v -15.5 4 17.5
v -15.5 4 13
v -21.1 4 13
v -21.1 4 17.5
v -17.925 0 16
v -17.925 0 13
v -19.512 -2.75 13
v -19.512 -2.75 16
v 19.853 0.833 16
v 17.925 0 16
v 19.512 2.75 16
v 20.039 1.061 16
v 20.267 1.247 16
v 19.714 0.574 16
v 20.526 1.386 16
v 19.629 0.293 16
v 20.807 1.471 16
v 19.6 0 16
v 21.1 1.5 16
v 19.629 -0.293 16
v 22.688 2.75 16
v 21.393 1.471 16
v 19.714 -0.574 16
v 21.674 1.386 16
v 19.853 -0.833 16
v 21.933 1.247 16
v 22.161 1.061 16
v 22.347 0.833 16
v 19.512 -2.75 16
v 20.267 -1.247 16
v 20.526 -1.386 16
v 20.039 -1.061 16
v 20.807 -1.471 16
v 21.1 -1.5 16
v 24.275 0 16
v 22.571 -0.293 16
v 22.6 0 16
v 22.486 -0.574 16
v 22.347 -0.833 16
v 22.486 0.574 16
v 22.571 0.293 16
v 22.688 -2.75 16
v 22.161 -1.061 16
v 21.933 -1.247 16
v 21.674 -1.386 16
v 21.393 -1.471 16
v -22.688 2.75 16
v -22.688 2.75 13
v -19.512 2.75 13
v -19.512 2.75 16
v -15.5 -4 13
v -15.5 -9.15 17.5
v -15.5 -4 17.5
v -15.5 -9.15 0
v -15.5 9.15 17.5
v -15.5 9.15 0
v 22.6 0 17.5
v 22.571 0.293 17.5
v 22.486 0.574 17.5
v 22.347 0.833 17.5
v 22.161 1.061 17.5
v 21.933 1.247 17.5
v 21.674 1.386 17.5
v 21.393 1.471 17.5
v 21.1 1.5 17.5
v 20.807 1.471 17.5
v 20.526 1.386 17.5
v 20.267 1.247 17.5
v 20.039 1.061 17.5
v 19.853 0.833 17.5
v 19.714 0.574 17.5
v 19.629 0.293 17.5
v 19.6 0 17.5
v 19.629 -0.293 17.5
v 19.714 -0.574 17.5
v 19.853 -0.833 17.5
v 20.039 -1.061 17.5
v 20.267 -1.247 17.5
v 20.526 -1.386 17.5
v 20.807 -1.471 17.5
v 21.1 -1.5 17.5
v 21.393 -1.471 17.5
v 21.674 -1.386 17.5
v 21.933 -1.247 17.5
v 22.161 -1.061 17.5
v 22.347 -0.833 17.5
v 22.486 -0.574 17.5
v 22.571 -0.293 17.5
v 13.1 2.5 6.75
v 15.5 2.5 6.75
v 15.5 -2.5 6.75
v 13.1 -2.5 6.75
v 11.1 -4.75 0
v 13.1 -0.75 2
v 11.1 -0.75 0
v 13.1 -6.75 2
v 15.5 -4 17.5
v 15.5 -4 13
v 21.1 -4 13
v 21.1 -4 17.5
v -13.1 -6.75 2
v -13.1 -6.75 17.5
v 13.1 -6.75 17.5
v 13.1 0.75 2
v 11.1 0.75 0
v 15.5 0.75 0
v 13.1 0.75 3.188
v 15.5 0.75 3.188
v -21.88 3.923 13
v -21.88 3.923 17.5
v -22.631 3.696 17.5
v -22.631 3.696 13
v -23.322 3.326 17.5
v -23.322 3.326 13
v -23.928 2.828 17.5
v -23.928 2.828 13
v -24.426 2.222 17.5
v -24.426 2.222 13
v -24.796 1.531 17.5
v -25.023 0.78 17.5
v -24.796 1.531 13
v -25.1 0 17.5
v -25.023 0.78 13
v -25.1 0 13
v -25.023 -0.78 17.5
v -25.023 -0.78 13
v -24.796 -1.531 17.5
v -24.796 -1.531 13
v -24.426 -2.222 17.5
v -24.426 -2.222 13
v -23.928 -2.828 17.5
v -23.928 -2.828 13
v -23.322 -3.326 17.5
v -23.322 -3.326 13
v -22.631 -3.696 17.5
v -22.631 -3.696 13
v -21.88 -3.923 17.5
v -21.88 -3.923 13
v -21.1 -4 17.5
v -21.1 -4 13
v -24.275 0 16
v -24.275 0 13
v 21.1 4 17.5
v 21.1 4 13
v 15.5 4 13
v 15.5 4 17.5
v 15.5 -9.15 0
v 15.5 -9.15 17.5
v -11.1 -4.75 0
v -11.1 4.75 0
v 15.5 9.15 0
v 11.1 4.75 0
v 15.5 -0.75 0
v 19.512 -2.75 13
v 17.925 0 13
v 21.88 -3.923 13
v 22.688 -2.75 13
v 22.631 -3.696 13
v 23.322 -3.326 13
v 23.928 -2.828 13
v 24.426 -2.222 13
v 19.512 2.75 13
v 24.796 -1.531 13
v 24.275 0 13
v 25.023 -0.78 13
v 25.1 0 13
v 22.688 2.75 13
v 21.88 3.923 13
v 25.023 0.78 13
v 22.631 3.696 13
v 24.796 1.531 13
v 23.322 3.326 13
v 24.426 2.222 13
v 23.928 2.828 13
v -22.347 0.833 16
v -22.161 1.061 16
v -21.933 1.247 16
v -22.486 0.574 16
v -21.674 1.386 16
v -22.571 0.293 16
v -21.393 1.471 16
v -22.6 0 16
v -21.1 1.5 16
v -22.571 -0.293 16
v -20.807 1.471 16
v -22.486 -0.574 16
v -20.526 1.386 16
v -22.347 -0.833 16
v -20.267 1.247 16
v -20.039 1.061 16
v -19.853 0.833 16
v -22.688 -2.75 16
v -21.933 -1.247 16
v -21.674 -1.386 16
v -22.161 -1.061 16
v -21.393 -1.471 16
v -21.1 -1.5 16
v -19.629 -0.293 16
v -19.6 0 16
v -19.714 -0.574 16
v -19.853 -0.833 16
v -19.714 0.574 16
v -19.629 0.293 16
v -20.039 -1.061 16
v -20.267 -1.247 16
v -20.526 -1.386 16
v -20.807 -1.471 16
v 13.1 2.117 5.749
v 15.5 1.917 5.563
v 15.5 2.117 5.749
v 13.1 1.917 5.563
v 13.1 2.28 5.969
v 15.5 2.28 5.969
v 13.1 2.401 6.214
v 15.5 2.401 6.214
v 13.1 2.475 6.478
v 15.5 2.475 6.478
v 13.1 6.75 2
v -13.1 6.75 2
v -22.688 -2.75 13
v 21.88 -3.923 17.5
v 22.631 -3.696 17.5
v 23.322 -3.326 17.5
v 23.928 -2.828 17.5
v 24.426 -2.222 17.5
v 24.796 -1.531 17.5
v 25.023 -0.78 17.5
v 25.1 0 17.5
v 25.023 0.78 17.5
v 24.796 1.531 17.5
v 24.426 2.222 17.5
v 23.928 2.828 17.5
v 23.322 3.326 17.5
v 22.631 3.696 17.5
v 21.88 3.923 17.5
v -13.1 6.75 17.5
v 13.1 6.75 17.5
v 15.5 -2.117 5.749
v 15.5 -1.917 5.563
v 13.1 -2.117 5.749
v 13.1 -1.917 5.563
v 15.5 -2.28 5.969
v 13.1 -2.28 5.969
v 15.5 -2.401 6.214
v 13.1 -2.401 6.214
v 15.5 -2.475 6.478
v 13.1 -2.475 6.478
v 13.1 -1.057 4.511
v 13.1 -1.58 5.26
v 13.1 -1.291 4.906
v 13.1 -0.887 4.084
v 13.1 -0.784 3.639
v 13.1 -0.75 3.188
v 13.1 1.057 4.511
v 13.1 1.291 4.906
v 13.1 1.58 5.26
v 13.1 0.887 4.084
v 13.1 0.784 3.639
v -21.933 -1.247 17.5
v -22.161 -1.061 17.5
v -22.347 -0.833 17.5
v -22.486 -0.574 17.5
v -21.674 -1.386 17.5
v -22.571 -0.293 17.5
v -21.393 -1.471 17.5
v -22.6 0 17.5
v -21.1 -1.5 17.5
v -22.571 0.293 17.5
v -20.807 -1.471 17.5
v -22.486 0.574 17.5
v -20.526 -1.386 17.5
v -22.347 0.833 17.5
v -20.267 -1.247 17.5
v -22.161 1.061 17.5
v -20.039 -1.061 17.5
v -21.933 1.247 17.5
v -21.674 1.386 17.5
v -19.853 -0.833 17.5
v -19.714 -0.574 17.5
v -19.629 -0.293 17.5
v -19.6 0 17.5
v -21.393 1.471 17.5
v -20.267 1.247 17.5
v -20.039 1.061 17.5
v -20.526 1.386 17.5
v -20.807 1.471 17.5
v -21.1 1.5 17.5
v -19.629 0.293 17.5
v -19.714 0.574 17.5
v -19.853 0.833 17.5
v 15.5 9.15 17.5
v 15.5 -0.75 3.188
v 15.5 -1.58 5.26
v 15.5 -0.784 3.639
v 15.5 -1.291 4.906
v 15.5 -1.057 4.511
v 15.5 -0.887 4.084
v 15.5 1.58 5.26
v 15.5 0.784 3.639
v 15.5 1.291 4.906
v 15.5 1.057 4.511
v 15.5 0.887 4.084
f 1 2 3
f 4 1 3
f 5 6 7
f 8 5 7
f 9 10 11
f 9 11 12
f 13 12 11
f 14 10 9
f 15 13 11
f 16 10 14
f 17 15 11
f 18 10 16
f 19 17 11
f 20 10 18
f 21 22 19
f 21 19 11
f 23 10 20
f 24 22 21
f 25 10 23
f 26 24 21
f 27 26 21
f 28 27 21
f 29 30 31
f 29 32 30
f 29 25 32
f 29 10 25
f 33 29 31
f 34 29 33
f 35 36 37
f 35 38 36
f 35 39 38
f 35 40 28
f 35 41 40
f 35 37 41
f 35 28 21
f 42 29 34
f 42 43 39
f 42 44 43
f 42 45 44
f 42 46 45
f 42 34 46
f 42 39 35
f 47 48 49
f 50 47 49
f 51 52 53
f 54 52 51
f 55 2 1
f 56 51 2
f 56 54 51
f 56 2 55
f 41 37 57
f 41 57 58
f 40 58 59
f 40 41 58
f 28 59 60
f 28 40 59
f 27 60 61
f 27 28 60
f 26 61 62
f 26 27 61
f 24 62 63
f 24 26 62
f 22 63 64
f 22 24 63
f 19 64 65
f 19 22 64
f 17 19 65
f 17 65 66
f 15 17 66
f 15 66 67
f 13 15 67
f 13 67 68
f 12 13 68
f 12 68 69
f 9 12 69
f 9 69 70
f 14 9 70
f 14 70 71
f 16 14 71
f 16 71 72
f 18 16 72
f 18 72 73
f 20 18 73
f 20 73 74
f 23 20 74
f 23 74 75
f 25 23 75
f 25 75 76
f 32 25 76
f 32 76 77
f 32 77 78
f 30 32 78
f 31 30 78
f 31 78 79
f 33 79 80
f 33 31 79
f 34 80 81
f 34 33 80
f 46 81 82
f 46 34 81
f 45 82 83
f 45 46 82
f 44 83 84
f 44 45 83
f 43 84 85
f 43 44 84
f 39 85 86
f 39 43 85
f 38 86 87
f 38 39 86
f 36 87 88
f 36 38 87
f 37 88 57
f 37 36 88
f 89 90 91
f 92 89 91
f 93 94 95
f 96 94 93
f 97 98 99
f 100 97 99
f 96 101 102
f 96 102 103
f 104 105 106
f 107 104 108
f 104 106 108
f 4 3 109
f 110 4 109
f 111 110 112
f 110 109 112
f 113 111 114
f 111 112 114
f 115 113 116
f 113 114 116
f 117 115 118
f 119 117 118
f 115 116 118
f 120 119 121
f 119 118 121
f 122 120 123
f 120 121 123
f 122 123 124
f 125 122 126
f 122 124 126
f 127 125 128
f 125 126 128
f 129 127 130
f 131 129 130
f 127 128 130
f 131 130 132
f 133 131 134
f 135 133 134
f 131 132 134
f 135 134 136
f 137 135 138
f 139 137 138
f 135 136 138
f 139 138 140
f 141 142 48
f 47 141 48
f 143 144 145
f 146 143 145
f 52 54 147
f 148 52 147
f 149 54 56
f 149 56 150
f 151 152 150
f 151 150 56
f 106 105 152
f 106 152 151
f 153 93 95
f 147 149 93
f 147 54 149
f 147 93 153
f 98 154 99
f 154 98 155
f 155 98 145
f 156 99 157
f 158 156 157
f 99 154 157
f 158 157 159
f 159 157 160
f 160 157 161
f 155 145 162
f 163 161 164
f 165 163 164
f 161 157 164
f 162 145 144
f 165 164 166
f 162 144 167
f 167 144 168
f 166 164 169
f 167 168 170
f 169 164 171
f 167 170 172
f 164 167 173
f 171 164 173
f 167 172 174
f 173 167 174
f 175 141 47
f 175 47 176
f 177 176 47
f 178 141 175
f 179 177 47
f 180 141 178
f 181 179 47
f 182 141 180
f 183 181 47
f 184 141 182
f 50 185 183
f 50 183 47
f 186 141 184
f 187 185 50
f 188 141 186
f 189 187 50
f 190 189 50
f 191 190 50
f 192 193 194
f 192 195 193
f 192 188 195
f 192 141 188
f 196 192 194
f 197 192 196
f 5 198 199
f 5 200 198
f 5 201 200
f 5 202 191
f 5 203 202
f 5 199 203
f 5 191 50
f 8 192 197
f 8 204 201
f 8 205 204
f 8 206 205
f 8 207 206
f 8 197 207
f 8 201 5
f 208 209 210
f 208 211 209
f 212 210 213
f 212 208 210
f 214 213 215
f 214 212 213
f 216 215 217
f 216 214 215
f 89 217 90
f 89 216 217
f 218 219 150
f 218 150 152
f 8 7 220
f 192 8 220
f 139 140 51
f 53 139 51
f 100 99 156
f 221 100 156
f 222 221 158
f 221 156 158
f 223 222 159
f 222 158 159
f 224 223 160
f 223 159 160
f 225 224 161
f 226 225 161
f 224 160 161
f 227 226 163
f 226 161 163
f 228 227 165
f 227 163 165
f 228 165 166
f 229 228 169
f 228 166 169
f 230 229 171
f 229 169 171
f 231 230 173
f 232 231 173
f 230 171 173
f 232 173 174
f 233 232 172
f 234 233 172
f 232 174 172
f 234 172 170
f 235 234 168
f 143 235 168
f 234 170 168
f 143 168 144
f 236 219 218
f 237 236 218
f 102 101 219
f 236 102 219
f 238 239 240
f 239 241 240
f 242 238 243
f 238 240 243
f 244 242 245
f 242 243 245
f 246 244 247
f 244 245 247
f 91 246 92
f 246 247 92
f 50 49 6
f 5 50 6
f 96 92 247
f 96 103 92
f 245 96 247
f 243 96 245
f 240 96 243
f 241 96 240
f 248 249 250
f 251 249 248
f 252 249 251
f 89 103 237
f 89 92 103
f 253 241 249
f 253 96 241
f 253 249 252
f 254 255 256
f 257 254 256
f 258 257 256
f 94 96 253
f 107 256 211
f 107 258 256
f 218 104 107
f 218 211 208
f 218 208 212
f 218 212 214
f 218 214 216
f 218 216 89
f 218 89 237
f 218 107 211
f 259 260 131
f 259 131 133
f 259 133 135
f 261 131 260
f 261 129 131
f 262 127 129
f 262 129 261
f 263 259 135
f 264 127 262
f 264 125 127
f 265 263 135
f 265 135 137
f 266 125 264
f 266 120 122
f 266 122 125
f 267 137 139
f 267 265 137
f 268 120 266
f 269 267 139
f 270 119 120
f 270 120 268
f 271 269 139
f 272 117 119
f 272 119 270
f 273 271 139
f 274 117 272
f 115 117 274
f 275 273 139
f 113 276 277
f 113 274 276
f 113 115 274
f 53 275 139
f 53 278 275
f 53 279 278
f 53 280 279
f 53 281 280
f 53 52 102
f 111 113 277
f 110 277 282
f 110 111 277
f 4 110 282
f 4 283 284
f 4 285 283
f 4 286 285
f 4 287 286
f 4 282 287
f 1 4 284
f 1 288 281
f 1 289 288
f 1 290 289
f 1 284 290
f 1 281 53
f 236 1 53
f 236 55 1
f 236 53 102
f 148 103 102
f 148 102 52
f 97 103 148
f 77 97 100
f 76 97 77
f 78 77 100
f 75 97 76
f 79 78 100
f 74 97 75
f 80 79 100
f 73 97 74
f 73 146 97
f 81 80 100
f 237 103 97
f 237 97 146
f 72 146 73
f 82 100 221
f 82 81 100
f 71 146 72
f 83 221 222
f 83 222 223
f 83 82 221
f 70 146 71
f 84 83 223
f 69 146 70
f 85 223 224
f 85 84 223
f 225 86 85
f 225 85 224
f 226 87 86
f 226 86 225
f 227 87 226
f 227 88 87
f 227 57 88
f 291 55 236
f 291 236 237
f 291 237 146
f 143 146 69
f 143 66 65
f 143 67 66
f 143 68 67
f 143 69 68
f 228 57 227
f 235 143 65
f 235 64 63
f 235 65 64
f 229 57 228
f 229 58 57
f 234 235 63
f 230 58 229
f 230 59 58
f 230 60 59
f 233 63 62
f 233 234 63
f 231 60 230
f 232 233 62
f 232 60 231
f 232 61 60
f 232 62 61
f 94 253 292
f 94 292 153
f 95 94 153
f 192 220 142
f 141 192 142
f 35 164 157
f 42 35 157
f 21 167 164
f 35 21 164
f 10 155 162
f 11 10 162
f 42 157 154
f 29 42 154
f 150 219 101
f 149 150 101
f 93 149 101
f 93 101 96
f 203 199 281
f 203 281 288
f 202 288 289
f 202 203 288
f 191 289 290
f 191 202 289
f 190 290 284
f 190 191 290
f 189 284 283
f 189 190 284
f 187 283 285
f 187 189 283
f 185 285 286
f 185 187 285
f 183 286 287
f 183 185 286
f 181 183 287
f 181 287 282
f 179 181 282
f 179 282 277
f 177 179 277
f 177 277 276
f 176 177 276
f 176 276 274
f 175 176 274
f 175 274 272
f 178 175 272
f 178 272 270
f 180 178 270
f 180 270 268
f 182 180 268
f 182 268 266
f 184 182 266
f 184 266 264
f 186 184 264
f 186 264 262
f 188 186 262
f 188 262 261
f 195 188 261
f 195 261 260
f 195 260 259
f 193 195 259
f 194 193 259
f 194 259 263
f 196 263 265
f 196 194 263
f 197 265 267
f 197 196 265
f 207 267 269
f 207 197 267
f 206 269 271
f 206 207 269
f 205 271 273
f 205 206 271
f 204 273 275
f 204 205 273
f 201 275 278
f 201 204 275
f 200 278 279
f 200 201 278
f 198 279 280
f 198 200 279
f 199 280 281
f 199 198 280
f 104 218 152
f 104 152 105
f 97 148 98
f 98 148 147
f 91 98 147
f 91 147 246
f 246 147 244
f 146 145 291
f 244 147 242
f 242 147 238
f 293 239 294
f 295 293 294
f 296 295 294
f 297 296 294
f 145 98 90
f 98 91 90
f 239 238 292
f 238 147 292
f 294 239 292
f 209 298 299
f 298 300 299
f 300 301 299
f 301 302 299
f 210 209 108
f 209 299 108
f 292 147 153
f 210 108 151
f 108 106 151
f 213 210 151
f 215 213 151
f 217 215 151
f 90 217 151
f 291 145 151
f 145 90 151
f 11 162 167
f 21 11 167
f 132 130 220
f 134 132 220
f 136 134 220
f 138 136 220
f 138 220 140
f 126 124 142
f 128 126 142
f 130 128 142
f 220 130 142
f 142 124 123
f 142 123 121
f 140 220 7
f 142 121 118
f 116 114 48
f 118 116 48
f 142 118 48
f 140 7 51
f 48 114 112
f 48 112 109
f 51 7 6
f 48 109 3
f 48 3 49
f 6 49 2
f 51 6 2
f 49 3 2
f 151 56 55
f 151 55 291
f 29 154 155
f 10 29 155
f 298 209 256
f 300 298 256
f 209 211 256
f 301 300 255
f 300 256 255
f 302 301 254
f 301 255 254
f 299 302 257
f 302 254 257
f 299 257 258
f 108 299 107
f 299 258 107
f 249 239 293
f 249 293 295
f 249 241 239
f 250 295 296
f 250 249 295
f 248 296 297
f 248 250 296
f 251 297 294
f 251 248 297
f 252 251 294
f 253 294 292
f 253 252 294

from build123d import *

# Parameters (mm, degrees)
F0_W      = 31
F0_H      = 18.3
F0_W_2    = 26.2
F0_H_2    = 13.5
F1_DEPTH  = 17.5
F2_W      = 26.2
F2_H      = 13.5
F2_W_2    = 22.2
F2_H_2    = 9.5
F3_DEPTH  = 2
F4_SIZE   = 1.99999
F6_START  = 13
F5_R      = 1.5
F6_DEPTH  = 4.5
F8_DEPTH  = 3
F10_DEPTH = 5
F11_R     = 1.49999
F12_R     = 3


# Not quite as in the source:
# - a fillet or chamfer is up to 0.001 mm smaller than in the source, because OpenCascade refuses the exact size


with BuildPart() as f1:
    # F0 (on Top) → F1 (new body)
    with BuildSketch(Plane.XY):
        Rectangle(F0_W, F0_H)
        Rectangle(F0_W_2, F0_H_2, mode=Mode.SUBTRACT)
    extrude(amount=F1_DEPTH)

    # F2 (on face) → F3 (join)
    with BuildSketch(Plane(origin=(0, 0, 0), x_dir=(1, 0, 0), z_dir=(0, 0, -1))):
        Rectangle(F2_W, F2_H)
        Rectangle(F2_W_2, F2_H_2, mode=Mode.SUBTRACT)
    extrude(amount=-F3_DEPTH)

    # F4 (size 2 in the source; OpenCascade refuses exactly that, so slightly less here)
    f4_edges = [f1.edges().sort_by_distance(p)[0] for p in [
        (0, 4.75, 2),
        (11.1, 0, 2),
        (0, -4.75, 2),
        (-11.1, 0, 2),
    ]]
    chamfer(f4_edges, length=F4_SIZE)

    # F5 (on Top) → F6 (join)
    with BuildSketch(Plane.XY.offset(F6_START)):
        with BuildLine():
            Line((17.1, -4), (21.1, -4))
            ThreePointArc((21.1, -4), (25.1, 0), (21.1, 4))
            Line((21.1, 4), (17.1, 4))
            Line((17.1, 4), (15.5, 4))
            Line((15.5, 4), (15.5, -4))
            Line((15.5, -4), (17.1, -4))
        make_face()
        with Locations((21.1, 0)):
            Circle(F5_R, mode=Mode.SUBTRACT)
        with BuildLine():
            ThreePointArc((-21.1, 4), (-25.1, 0), (-21.1, -4))
            Line((-21.1, -4), (-17.1, -4))
            Line((-17.1, -4), (-15.5, -4))
            Line((-15.5, -4), (-15.5, 4))
            Line((-15.5, 4), (-17.1, 4))
            Line((-17.1, 4), (-21.1, 4))
        make_face()
        with Locations((-21.1, 0)):
            Circle(F5_R, mode=Mode.SUBTRACT)
    extrude(amount=F6_DEPTH)

    # F7 (on face) → F8 (cut)
    with BuildSketch(Plane(origin=(0, 0, 13), x_dir=(1, 0, 0), z_dir=(0, 0, -1))):
        Polygon((22.6877132403, 2.75), (19.5122867597, 2.75), (17.9245735195, 0), (19.5122867597, -2.75), (22.6877132403, -2.75), (24.2754264805, 0), align=None)
        Polygon((-19.5122867597, 2.75), (-22.6877132403, 2.75), (-24.2754264805, 0), (-22.6877132403, -2.75), (-19.5122867597, -2.75), (-17.9245735195, 0), align=None)
    extrude(amount=-F8_DEPTH, mode=Mode.SUBTRACT)

    # F9 (on face) → F10 (cut)
    with BuildSketch(Plane.YZ.offset(15.5)):
        Polygon((0.75, 5.25), (2.5, 5.25), (2.5, 6.75), (-2.5, 6.75), (-2.5, 5.25), (-0.75, 5.25), (-0.75, 0), (0.75, 0), align=None)
    extrude(amount=-F10_DEPTH, mode=Mode.SUBTRACT)

    # F11 (radius 1.5 in the source; OpenCascade refuses exactly that, so slightly less here)
    f11_edges = [f1.edges().sort_by_distance(p)[0] for p in [
        (14.3, -2.5, 5.25),
        (14.3, 2.5, 5.25),
    ]]
    fillet(f11_edges, radius=F11_R)

    # F12
    f12_edges = [f1.edges().sort_by_distance(p)[0] for p in [
        (14.3, -0.75, 5.25),
        (14.3, 0.75, 5.25),
    ]]
    fillet(f12_edges, radius=F12_R)


solid = f1.part
